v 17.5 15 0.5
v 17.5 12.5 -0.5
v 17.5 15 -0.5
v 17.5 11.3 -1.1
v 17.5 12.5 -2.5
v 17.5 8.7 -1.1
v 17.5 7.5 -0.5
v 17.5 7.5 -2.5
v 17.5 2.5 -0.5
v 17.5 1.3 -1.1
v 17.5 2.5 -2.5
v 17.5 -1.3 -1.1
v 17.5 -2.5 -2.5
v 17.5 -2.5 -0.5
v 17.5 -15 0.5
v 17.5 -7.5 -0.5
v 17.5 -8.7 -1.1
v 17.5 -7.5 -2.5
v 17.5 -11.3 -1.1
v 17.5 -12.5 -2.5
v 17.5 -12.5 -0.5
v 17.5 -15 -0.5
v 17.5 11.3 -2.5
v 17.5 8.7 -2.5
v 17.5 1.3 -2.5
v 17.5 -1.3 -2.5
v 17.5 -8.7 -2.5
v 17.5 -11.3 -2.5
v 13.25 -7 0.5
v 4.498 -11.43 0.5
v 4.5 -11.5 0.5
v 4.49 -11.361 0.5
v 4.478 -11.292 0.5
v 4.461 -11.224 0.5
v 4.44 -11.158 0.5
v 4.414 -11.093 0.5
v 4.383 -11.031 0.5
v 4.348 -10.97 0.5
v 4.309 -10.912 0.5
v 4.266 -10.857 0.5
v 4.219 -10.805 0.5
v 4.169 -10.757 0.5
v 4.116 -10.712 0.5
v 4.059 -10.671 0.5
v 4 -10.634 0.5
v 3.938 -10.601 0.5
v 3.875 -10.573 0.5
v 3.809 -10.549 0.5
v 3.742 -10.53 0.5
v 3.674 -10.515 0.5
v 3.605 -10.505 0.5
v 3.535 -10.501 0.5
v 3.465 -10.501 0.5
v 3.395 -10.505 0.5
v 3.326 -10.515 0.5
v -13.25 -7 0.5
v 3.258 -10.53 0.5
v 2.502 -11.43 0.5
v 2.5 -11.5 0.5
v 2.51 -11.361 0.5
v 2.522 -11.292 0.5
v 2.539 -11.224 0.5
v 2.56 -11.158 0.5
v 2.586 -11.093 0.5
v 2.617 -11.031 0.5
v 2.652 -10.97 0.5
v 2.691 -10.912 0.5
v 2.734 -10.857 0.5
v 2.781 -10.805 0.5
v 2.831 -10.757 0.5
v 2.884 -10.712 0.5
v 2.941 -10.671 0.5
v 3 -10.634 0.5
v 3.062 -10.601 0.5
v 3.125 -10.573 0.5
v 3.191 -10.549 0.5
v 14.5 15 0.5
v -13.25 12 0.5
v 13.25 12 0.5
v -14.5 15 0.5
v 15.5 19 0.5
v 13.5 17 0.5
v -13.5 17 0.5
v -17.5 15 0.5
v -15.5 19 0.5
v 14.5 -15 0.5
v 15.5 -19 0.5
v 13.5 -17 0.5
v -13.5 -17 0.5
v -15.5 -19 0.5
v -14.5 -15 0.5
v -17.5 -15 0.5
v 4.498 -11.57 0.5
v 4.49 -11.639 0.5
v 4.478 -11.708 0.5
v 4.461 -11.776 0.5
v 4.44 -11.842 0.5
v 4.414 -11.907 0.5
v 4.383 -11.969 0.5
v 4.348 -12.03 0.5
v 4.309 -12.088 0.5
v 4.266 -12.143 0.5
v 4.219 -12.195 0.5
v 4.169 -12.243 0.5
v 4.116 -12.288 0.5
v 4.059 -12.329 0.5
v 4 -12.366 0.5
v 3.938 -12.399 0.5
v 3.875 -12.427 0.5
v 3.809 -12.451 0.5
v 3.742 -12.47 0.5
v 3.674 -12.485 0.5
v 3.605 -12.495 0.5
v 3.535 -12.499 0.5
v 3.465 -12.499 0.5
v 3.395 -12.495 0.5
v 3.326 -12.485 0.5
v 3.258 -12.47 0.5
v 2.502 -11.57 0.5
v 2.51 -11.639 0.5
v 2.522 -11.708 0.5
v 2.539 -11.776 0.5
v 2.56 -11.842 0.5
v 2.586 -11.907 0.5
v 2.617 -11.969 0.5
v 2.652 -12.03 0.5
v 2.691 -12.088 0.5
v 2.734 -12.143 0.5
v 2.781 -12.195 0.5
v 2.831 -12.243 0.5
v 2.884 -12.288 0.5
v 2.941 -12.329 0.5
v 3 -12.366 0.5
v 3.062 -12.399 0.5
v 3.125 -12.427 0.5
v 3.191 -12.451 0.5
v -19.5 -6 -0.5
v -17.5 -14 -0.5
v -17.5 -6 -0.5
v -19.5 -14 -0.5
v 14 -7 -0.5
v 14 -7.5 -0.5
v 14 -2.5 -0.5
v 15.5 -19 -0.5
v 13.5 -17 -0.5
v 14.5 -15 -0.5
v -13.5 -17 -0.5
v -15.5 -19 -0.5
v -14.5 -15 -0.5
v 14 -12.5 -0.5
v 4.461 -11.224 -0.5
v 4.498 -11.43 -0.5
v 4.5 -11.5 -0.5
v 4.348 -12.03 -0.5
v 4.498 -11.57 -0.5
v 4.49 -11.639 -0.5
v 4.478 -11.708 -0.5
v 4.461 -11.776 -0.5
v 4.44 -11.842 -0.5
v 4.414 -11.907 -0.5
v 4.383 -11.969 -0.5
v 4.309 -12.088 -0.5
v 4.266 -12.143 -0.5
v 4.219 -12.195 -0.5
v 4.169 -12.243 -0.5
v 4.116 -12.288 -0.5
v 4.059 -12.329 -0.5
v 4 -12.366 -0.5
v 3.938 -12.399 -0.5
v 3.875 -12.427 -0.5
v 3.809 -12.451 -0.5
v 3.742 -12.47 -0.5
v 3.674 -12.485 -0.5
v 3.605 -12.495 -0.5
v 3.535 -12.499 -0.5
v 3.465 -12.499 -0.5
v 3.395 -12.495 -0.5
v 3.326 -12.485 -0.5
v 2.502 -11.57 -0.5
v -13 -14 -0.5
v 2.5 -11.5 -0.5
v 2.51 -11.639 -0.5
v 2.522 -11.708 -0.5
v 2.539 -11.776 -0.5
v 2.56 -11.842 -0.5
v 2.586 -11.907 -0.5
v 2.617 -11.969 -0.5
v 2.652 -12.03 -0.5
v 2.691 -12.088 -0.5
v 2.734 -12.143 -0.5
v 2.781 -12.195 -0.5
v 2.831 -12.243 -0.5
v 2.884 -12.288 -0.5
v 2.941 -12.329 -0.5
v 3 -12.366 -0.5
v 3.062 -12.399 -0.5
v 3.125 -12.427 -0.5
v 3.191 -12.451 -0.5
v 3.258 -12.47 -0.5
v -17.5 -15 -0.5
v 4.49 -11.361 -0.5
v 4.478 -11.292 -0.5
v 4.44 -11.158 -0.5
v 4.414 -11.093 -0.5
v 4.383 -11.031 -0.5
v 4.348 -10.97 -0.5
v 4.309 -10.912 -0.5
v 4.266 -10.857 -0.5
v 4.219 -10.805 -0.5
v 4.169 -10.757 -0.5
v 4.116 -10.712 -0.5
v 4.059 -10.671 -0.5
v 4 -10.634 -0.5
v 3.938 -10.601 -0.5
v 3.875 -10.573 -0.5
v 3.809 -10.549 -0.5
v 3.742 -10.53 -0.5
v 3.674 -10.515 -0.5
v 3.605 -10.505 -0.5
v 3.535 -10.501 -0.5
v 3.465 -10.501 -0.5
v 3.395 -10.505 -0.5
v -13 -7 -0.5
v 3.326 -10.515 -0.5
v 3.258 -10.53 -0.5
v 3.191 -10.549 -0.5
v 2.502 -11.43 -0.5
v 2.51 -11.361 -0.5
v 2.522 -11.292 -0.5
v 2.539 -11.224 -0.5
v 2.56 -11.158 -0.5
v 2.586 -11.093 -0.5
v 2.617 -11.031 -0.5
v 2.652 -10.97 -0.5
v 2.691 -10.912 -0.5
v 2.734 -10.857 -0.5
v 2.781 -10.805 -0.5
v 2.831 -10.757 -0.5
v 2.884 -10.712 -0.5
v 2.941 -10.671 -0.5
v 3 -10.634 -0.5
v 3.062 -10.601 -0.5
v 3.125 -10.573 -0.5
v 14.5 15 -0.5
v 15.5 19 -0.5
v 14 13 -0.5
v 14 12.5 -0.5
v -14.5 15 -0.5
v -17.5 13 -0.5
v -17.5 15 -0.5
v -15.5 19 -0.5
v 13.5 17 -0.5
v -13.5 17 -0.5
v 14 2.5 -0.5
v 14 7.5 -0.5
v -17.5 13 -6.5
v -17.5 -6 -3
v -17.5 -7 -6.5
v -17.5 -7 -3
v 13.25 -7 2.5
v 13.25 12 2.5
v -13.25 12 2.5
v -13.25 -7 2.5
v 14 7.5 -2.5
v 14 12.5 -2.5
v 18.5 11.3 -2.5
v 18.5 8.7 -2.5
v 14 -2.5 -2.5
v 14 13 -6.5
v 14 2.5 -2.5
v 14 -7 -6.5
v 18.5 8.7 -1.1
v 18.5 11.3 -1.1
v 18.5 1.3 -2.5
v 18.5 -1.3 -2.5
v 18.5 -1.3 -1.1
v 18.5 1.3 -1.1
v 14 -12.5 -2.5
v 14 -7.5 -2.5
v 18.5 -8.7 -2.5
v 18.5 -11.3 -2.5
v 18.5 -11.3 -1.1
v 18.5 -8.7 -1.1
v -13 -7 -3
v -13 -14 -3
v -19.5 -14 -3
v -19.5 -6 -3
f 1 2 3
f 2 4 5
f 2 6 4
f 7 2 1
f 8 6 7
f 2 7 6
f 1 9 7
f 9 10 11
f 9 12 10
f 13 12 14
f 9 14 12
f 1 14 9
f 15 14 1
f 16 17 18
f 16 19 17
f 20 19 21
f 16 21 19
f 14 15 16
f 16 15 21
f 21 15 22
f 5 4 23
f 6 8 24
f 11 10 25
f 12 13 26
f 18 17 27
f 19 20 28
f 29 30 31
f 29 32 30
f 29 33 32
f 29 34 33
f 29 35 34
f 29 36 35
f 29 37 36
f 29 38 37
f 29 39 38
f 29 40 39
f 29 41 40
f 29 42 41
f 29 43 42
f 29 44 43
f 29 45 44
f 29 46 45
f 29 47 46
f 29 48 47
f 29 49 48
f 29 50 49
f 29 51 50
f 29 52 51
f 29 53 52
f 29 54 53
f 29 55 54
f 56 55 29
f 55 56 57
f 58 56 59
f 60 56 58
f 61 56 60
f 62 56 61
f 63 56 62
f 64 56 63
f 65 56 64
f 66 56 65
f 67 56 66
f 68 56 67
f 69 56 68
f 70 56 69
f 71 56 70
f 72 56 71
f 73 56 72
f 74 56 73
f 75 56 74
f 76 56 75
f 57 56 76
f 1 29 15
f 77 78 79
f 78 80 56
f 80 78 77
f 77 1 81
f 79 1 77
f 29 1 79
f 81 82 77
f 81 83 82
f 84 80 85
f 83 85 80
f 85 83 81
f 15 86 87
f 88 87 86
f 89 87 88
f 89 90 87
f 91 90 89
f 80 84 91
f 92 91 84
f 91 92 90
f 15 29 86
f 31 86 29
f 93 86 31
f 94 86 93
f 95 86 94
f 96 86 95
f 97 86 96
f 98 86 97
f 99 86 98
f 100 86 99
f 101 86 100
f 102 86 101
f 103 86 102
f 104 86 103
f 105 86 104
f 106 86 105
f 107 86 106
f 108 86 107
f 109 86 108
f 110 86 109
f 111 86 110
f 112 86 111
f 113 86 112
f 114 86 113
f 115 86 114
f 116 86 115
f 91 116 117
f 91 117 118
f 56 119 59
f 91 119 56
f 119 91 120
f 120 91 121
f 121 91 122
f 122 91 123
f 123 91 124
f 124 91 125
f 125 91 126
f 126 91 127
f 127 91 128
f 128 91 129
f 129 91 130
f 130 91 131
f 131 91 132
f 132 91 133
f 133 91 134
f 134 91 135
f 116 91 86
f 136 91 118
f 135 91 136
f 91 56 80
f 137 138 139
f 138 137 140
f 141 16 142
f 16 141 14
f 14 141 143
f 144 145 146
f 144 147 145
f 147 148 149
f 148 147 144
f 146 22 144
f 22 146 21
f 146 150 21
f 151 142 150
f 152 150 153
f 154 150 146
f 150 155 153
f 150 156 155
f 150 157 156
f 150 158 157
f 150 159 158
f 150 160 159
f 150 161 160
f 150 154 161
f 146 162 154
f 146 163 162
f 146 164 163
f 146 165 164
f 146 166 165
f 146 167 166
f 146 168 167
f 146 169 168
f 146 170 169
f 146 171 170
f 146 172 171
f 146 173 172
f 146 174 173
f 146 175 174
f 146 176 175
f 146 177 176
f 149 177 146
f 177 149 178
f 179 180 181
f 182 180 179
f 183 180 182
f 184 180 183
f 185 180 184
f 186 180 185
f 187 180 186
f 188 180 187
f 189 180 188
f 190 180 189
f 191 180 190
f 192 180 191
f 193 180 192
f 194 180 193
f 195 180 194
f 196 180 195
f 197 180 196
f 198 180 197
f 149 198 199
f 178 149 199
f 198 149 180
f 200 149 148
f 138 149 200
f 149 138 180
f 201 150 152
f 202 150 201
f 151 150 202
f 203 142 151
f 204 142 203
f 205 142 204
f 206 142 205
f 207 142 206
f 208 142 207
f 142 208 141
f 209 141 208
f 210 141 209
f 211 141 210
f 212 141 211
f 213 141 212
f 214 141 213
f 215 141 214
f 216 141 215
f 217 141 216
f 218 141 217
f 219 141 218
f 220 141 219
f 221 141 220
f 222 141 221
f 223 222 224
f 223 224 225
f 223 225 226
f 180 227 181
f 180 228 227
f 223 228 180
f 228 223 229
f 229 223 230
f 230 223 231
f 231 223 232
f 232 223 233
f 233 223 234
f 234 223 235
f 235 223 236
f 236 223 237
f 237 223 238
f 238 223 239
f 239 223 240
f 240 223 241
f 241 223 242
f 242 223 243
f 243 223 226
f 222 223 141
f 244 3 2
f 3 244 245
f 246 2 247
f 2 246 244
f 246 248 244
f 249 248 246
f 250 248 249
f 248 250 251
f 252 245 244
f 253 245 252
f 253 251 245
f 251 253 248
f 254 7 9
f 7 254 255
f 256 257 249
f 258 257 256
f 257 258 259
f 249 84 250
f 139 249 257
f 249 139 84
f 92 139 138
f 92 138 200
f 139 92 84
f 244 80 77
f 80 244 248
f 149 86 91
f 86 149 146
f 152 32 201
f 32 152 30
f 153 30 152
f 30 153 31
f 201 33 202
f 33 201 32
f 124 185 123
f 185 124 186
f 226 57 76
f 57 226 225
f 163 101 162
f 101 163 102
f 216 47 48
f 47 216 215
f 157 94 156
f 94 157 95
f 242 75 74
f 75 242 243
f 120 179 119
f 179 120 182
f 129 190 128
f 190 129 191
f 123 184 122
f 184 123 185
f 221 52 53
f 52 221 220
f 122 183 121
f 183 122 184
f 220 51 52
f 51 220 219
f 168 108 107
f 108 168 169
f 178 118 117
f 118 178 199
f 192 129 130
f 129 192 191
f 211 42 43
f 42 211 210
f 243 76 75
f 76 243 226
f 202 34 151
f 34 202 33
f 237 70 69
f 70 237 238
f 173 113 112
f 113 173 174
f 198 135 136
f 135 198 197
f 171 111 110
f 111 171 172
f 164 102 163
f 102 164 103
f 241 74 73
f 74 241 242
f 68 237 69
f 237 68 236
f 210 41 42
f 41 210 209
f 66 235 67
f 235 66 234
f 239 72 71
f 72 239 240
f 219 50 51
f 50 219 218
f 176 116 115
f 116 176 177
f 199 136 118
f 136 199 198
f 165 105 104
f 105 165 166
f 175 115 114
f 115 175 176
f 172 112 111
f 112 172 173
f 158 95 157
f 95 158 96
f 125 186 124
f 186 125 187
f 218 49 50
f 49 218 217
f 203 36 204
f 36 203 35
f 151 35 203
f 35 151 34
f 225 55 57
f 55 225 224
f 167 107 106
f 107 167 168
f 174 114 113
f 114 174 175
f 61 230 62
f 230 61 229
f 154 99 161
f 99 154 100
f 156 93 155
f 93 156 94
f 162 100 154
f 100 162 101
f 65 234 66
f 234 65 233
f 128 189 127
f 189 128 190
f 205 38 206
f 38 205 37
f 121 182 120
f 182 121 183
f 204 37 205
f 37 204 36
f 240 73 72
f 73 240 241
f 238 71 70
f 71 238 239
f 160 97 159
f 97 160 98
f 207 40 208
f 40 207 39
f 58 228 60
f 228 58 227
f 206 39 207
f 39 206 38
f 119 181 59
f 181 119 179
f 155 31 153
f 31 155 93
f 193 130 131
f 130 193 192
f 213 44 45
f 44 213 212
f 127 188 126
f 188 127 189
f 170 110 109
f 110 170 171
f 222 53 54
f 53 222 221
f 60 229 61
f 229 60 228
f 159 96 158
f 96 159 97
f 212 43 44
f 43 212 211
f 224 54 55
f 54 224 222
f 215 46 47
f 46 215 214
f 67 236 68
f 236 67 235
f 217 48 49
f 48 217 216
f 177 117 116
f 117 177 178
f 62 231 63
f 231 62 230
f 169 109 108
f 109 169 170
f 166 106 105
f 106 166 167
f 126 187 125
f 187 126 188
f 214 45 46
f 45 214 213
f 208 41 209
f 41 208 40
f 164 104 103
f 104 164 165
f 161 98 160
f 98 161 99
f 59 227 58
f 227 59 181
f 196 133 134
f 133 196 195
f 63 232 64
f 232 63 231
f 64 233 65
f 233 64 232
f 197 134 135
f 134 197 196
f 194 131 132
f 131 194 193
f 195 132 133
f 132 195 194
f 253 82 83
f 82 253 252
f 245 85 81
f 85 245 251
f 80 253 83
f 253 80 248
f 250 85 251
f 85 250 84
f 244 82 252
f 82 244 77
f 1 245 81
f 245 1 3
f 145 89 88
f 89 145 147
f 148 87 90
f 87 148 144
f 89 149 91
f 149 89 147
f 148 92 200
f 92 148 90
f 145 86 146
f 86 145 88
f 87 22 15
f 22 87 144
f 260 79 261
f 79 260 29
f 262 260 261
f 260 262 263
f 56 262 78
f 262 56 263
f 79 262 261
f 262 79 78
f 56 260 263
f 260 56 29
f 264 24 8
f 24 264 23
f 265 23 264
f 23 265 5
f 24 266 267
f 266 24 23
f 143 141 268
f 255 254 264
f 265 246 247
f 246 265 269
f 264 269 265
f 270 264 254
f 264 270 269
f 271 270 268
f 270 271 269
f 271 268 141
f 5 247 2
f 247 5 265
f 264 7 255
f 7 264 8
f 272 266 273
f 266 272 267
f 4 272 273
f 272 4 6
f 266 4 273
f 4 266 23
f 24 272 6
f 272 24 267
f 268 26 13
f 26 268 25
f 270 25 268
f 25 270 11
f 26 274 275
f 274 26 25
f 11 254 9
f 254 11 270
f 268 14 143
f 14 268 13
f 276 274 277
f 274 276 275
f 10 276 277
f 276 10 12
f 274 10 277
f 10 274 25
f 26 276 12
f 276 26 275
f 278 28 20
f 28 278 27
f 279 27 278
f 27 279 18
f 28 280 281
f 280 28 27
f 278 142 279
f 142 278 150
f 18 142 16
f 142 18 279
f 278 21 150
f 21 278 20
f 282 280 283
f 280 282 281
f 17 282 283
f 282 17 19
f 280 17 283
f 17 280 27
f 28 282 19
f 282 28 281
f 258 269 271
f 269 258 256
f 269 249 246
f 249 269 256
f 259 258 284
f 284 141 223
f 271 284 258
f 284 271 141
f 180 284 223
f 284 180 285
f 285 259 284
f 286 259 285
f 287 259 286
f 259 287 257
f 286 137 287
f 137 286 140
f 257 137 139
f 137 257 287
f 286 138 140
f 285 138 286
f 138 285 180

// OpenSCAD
// All units in millimeters
handle_height = 2;
handle_outer_width = 31;
handle_inner_width = 27;
handle_distance = 2;
handle_conn_width = 3;

pcb_width = 35;
pcb_height = 30;
pcb_thickness = 1;

oled_offset_top = 3;
oled_nodisp_height = 4;
oled_disp_height = 15;
oled_width = 26.5;
oled_thickness = 2;

battery_width = 31.5;
battery_height = 20;
battery_thickness = 6;
battery_offset_left = 0;
battery_offset_bottom = 8;

button_height = 5;
button_width = 3.5;
button_thickness = 2;

button_knob_thickness = 1.4;
button_knob_height = 2.6;
button_knob_width = 1;

button1_offset_top =  2.5;
button2_offset_top = 12.5;
button3_offset_top = 22.5;

usbconn_width = 6.5;
usbconn_height = 8;
usbconn_thickness = 2.5;
usbconn_width_pcb = 4.5;
usbconn_offset_bottom = 1;

pcb_drillhole_offset_bottom = 3.5;
pcb_drillhole_offset_right = 14;
pcb_drillhole_diameter = 2;

module pcb_handle() {
	linear_extrude(height = pcb_thickness)  polygon(points=[
		[-handle_inner_width / 2, pcb_height / 2 + handle_distance],
		[handle_inner_width / 2, pcb_height / 2 + handle_distance],
		[handle_outer_width / 2, pcb_height / 2 + handle_distance + handle_height],
		[-handle_outer_width / 2, pcb_height / 2 + handle_distance + handle_height]
	]);

	linear_extrude(height = pcb_thickness)  polygon(points=[
		[-pcb_width / 2, pcb_height / 2],
		[-pcb_width / 2 + handle_conn_width, pcb_height / 2],
		[-handle_inner_width / 2, pcb_height / 2 + handle_distance],
		[-handle_outer_width / 2, pcb_height / 2 + handle_distance + handle_height]
	]);

	linear_extrude(height = pcb_thickness)  polygon(points=[
		[pcb_width / 2, pcb_height / 2],
		[pcb_width / 2 - handle_conn_width, pcb_height / 2],
		[handle_inner_width / 2, pcb_height / 2 + handle_distance],
		[handle_outer_width / 2, pcb_height / 2 + handle_distance + handle_height]
	]);
}

module pcb_drillhole() {
	translate([pcb_width / 2 - pcb_drillhole_offset_right,
			-pcb_height / 2 + pcb_drillhole_offset_bottom, 0]) {
		cylinder(h = pcb_thickness * 2, d1 = pcb_drillhole_diameter, $fn = 90, center = true);
	}
}

module pcb() {
	color([0, 0.6, 0, 1]) {
		difference() {
			translate([-pcb_width / 2, -pcb_height / 2, -pcb_thickness / 2]) {
				cube(size = [pcb_width, pcb_height, pcb_thickness]);
			}
			pcb_drillhole();
		}

		translate([0, 0, -pcb_thickness / 2]) {
			// Upper handle
			pcb_handle();

			// Lower handle
			mirror([0, 1, 0]) pcb_handle();
		}
	}
}

module oled() {
	translate([-oled_width / 2, pcb_height / 2 - oled_offset_top, pcb_thickness / 2]) {
		// Controller area
		color([0.5, 0.5, 0.5, 0.5]) {
			translate([0, -oled_nodisp_height, 0])
				cube(size = [oled_width, oled_nodisp_height, oled_thickness]);
		}

		// Display area
		color([0, 0, 0, 0.8]) {
			translate([0, -oled_nodisp_height - oled_disp_height, 0])
				cube(size = [oled_width, oled_disp_height, oled_thickness]);
		}
	}
}

module battery() {
	translate([-pcb_width / 2, -pcb_height / 2, -pcb_thickness / 2]) {
		translate([battery_offset_left, battery_offset_bottom, -battery_thickness]) {
			color([0.5, 0.5, 0.5, 1.0])
			cube(size = [battery_width, battery_height, battery_thickness]);
		}
	}
}

module button(offsetx, offsety) {
	translate([offsetx, offsety, -button_thickness - pcb_thickness / 2]) {
		color([0.7, 0.7, 0.7, 1.0]) {
			cube(size = [button_width, button_height, button_thickness]);
		}
	
		translate([button_width, button_height / 2 - button_knob_height / 2, 0]) {
			color([0.2, 0.2, 0.2, 1.0]) {
				cube(size = [button_knob_width, button_knob_height, button_knob_thickness]);
			}
		}
	}
}

module buttons() {
	button(pcb_width / 2 - button_width, pcb_height / 2 - button_height -  button1_offset_top);
	button(pcb_width / 2 - button_width, pcb_height / 2 - button_height -  button2_offset_top);
	button(pcb_width / 2 - button_width, pcb_height / 2 - button_height -  button3_offset_top);
}

module usbconn(offsetx, offsety) {
	translate([offsetx, offsety, -pcb_thickness / 2 - usbconn_thickness]) {
		color([0.3, 0.3, 0.3, 1.0]) {
			cube([usbconn_width, usbconn_height, usbconn_thickness]);
		}
	}
}

module connectors() {
	usbconn(-pcb_width / 2 - usbconn_width + usbconn_width_pcb, -pcb_height / 2 + usbconn_offset_bottom);
}

module watch(centerx, centery) {
	translate([centerx, centery]) {
		pcb();
		oled();
		battery();
		buttons();
		connectors();
	}
}

watch(0, 0);
